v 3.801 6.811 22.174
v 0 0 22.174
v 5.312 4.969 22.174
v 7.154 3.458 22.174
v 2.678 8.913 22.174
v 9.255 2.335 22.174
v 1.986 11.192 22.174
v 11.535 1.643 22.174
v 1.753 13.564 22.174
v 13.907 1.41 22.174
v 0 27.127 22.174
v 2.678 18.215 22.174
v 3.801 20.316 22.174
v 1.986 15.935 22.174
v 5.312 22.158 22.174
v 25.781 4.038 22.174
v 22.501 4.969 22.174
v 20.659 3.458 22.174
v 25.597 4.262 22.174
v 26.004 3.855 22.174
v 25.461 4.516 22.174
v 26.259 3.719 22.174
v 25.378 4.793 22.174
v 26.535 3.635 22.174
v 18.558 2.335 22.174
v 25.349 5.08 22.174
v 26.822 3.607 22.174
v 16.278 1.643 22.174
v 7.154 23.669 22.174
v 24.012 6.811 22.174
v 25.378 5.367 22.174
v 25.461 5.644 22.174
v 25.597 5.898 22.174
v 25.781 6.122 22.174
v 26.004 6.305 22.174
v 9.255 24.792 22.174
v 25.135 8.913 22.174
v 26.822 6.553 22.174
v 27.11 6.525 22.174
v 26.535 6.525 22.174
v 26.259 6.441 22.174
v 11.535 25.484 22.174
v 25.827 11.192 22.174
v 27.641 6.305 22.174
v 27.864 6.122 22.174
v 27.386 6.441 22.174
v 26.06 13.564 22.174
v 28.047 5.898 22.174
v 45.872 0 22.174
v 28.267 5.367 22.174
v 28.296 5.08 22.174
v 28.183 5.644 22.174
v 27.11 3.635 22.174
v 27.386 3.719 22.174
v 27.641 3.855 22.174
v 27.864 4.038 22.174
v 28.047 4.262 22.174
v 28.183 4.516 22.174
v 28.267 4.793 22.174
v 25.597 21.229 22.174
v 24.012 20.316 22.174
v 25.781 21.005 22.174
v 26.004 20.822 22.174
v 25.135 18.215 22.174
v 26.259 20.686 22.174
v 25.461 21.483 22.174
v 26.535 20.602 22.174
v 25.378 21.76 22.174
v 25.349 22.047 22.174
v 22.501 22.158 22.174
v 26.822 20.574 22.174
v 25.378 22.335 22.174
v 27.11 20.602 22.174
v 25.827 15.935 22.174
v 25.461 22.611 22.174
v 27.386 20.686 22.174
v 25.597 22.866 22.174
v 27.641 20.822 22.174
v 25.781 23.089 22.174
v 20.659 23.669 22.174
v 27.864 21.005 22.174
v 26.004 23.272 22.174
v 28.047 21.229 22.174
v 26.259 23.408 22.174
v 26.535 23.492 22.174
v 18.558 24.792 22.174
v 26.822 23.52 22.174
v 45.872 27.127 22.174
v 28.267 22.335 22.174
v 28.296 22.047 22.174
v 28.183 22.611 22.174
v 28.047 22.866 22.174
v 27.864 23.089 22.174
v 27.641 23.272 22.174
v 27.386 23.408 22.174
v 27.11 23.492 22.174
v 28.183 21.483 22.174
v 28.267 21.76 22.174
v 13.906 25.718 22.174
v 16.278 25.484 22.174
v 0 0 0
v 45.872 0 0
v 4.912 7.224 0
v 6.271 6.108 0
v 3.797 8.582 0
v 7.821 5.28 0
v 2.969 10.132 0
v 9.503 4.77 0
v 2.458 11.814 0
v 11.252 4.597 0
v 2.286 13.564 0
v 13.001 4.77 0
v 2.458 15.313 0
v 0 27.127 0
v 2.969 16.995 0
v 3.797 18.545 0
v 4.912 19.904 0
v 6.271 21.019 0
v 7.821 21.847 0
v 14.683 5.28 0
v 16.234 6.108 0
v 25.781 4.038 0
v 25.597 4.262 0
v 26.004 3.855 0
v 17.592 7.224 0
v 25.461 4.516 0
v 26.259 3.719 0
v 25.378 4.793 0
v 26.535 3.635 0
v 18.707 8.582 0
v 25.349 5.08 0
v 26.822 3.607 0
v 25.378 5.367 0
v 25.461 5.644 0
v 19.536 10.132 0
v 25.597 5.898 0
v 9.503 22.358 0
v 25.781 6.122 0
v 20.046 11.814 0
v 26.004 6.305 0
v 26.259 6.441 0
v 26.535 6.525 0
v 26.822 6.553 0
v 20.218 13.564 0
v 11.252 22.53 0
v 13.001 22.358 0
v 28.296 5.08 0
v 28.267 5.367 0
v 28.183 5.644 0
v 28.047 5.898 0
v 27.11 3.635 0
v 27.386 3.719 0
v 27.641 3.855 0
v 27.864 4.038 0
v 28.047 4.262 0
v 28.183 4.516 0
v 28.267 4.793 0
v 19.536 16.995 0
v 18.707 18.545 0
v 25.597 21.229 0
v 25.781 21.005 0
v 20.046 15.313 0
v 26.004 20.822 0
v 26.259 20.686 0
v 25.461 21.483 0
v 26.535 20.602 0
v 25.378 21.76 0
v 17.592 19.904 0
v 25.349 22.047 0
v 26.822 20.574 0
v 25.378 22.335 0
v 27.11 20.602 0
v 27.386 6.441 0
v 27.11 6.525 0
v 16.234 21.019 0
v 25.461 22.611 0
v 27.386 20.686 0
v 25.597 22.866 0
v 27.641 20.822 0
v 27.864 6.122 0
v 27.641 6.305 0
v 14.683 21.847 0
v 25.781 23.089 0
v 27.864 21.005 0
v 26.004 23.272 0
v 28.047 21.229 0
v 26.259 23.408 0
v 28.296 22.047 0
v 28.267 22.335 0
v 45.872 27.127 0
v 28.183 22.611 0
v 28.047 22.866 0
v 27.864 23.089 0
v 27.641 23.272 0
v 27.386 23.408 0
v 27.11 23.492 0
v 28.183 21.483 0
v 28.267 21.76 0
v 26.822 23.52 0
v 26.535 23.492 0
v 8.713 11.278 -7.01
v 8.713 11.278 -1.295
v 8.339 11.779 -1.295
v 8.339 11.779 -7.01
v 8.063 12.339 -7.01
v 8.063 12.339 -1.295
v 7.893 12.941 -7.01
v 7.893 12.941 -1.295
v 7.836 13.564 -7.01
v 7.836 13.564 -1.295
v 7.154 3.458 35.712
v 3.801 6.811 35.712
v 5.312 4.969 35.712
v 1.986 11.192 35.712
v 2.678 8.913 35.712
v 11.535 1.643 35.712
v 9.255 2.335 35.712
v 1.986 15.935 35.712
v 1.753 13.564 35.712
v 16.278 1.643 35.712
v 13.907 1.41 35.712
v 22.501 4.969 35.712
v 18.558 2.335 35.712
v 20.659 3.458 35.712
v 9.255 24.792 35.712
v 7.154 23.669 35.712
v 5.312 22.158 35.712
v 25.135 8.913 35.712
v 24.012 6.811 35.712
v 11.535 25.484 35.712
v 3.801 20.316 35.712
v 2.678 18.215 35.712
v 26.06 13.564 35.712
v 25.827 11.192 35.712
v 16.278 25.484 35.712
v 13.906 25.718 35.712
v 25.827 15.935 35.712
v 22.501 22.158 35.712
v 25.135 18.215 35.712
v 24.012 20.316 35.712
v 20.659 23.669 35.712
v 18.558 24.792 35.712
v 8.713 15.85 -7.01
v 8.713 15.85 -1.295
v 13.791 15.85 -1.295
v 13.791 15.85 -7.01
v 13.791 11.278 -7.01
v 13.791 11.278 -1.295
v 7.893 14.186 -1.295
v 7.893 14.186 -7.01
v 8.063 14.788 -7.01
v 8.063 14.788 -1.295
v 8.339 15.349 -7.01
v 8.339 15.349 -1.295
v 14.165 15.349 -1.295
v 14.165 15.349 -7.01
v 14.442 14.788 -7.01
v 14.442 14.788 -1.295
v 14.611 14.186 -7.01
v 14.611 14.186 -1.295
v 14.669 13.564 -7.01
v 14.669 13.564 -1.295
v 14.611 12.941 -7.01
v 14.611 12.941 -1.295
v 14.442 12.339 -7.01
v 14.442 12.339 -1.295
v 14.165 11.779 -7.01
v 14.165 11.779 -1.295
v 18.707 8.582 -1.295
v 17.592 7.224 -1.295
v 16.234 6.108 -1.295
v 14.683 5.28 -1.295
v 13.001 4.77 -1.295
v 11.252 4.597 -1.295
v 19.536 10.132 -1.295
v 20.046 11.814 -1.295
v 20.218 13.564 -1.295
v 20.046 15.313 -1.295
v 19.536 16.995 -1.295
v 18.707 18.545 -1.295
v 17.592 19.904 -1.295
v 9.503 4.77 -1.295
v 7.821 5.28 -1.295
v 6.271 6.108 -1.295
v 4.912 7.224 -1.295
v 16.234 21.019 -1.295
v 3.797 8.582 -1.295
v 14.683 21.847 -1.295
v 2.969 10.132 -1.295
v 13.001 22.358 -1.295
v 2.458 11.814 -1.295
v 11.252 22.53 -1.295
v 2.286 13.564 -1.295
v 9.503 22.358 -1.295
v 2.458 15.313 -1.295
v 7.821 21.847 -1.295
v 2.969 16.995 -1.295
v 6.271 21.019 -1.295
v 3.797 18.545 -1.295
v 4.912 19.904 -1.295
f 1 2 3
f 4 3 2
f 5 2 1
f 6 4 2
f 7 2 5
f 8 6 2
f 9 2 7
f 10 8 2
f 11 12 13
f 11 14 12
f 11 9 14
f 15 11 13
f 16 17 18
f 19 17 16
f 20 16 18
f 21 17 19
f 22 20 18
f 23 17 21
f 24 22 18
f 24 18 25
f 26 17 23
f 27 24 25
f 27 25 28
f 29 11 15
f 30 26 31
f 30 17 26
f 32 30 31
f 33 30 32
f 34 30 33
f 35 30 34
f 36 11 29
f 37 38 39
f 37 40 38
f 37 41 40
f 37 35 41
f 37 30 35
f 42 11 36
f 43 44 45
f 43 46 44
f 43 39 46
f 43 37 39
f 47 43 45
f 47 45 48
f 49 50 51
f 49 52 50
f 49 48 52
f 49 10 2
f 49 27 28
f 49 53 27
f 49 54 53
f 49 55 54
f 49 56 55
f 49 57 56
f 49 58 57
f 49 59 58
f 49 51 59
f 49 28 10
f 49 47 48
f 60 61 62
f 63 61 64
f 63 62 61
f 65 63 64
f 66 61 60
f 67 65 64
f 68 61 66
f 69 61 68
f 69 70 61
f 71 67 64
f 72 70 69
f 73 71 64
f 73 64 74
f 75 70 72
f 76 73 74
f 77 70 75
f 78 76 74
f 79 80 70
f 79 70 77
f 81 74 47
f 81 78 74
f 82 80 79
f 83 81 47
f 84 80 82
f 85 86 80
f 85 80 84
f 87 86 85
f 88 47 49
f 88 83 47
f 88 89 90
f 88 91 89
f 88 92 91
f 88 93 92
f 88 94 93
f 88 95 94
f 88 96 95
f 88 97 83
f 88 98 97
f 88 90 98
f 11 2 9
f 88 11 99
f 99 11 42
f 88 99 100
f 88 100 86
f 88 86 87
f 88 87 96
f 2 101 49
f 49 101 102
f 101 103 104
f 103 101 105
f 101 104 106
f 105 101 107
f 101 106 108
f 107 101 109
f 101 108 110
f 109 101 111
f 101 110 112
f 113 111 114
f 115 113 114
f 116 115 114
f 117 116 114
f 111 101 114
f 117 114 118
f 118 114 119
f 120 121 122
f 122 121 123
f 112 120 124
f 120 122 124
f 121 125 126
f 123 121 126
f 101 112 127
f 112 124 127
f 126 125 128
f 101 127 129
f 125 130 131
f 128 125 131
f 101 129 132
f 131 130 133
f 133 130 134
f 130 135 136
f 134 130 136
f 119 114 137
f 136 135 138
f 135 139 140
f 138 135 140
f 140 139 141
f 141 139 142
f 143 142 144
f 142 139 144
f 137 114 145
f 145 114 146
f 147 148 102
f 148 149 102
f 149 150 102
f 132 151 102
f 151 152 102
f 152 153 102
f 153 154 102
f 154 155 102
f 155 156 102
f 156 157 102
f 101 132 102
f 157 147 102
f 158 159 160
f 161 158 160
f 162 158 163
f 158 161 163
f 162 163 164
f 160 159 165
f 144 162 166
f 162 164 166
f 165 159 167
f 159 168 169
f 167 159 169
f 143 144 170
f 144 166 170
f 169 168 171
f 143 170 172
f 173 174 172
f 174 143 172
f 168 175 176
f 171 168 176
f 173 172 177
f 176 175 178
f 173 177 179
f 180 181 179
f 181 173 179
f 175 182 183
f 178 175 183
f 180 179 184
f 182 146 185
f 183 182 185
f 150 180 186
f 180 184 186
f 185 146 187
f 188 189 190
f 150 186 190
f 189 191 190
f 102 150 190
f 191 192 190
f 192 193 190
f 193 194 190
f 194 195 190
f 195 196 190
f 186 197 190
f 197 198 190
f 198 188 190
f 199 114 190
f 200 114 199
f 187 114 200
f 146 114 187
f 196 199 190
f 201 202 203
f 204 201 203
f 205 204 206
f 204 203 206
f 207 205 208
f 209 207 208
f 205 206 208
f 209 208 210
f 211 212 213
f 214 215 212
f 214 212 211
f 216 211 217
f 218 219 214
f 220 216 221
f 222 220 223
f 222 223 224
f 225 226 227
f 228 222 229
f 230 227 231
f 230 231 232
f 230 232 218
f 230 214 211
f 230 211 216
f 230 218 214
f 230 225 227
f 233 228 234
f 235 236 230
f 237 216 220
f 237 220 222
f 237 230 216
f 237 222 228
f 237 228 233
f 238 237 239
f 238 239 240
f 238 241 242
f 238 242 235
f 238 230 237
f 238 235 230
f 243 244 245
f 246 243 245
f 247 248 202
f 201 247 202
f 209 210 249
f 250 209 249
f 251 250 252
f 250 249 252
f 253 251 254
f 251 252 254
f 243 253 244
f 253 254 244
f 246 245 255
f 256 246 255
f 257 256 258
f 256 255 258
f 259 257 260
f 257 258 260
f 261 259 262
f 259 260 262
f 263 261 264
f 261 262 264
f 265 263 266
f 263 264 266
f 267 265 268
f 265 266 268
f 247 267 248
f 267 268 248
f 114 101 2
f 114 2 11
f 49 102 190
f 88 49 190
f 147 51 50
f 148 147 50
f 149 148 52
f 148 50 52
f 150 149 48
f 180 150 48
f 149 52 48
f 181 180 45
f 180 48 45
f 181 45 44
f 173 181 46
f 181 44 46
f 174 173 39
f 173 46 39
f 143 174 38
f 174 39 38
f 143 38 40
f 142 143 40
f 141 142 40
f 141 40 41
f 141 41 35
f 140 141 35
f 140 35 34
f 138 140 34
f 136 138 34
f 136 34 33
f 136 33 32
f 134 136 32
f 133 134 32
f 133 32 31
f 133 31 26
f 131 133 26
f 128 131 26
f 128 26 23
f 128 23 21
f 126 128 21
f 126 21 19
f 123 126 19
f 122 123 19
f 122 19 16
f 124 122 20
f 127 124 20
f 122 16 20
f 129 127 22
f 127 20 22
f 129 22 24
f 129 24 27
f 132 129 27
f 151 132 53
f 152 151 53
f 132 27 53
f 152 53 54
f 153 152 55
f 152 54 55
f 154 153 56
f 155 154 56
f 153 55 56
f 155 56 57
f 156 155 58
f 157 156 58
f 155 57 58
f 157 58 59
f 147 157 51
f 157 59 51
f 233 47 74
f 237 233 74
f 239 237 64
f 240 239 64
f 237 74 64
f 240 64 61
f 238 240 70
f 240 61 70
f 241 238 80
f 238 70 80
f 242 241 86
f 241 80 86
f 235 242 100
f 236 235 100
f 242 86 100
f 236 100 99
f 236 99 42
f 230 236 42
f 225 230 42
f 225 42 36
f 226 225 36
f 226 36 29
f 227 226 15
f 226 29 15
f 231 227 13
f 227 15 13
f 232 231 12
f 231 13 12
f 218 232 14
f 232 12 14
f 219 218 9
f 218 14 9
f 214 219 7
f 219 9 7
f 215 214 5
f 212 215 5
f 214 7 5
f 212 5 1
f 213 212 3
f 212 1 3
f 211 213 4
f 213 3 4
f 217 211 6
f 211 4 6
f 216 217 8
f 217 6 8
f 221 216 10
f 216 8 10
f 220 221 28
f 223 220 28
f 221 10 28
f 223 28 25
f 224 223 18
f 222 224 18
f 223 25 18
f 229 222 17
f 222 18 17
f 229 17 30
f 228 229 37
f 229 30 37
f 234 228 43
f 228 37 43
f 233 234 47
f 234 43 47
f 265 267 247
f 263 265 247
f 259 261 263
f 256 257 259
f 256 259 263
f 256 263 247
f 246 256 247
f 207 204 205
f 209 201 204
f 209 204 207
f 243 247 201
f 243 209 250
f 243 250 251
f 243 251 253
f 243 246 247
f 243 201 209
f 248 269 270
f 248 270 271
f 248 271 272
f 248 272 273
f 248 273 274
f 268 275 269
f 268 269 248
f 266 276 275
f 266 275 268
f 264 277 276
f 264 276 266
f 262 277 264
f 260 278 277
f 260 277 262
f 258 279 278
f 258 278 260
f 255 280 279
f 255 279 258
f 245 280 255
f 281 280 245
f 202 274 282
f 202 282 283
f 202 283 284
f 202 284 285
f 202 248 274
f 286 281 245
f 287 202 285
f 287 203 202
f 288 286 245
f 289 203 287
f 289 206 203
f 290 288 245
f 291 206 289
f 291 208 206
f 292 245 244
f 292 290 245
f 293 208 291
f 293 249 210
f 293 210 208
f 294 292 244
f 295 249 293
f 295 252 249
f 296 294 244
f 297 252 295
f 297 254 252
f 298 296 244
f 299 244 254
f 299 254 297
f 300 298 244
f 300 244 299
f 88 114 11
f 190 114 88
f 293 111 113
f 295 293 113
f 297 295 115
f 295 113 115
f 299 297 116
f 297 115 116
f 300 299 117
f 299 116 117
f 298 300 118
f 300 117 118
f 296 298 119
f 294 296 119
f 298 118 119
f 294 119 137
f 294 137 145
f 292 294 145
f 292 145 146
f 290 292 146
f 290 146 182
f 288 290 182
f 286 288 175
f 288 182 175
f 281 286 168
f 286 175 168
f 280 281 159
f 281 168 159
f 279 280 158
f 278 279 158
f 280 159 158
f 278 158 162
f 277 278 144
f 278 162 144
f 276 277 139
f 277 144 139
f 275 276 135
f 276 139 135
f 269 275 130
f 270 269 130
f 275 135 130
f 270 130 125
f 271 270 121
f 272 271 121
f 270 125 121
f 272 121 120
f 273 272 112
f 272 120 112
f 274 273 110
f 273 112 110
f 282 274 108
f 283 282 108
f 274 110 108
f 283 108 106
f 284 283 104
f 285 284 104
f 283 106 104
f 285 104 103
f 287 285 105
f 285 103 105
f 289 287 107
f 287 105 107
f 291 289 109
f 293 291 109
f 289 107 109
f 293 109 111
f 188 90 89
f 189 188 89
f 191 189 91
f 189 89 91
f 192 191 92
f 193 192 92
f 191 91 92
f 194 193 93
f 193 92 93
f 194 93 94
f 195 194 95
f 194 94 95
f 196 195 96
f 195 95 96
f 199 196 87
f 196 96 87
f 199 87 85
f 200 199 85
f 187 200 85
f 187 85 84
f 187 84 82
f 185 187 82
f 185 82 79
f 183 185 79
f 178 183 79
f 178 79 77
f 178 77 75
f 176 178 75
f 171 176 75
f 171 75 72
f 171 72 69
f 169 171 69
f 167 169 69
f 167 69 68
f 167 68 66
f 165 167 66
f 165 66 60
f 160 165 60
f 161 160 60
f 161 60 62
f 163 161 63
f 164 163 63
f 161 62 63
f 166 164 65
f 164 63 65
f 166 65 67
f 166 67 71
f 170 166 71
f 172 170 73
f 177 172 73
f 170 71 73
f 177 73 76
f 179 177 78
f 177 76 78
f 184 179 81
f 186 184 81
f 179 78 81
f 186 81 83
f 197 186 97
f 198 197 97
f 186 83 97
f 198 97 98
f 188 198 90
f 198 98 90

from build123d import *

# Parameters (mm, degrees)
SKETCH1_W                   = 45.8724
SKETCH1_H                   = 27.1272
BOSS_EXTRUDE1_DEPTH         = 22.1742
SKETCH2_R                   = 12.1539
BOSS_EXTRUDE2_DEPTH         = 13.5382
SKETCH3_R                   = 8.9662
BOSS_EXTRUDE3_DEPTH         = 1.2954
BOSS_EXTRUDE4_DEPTH         = 5.715
F_32_0_116_DIAMETER_HOLE1_D = 2.9464


with BuildPart() as part:
    # Sketch1 → Boss-Extrude1 (new body)
    with BuildSketch(Plane.XY):
        with Locations((22.9362, 13.5636)):
            Rectangle(SKETCH1_W, SKETCH1_H)
    extrude(amount=BOSS_EXTRUDE1_DEPTH)

    # Sketch2 → Boss-Extrude2 (add)
    with BuildSketch(Plane.XY.offset(22.1742)):
        with Locations((13.9065, 13.5636)):
            Circle(SKETCH2_R)
    extrude(amount=BOSS_EXTRUDE2_DEPTH)

    # Sketch3 → Boss-Extrude3 (add)
    with BuildSketch(Plane(origin=(0, 0, 0), x_dir=(-1, 0, 0), z_dir=(0, 0, -1))):
        with Locations((-11.2522, 13.5636)):
            Circle(SKETCH3_R)
    extrude(amount=BOSS_EXTRUDE3_DEPTH)

    # Sketch4 → Boss-Extrude4 (add)
    with BuildSketch(Plane(origin=(0, 0, -1.2954), x_dir=(-1, 0, 0), z_dir=(0, 0, -1))):
        with BuildLine():
            Line((-8.713438552, 15.8496), (-13.790961448, 15.8496))
            ThreePointArc((-13.790961448, 15.8496), (-14.6685, 13.5636), (-13.790961448, 11.2776))
            Line((-13.790961448, 11.2776), (-8.713438552, 11.2776))
            ThreePointArc((-8.713438552, 11.2776), (-8.06282103, 12.339276727), (-7.8359, 13.5636))
            ThreePointArc((-7.8359, 13.5636), (-8.06282103, 14.787923273), (-8.713438552, 15.8496))
        make_face()
    extrude(amount=BOSS_EXTRUDE4_DEPTH)

    # #32 (0.116) Diameter Hole1 (through all)
    with Locations(Plane(origin=(0, 0, 0), x_dir=(-1, 0, 0), z_dir=(0, 0, -1))):
        with Locations((-26.8224, 22.0472), (-26.8224, 5.08)):
            Hole(F_32_0_116_DIAMETER_HOLE1_D / 2)


solid = part.part
